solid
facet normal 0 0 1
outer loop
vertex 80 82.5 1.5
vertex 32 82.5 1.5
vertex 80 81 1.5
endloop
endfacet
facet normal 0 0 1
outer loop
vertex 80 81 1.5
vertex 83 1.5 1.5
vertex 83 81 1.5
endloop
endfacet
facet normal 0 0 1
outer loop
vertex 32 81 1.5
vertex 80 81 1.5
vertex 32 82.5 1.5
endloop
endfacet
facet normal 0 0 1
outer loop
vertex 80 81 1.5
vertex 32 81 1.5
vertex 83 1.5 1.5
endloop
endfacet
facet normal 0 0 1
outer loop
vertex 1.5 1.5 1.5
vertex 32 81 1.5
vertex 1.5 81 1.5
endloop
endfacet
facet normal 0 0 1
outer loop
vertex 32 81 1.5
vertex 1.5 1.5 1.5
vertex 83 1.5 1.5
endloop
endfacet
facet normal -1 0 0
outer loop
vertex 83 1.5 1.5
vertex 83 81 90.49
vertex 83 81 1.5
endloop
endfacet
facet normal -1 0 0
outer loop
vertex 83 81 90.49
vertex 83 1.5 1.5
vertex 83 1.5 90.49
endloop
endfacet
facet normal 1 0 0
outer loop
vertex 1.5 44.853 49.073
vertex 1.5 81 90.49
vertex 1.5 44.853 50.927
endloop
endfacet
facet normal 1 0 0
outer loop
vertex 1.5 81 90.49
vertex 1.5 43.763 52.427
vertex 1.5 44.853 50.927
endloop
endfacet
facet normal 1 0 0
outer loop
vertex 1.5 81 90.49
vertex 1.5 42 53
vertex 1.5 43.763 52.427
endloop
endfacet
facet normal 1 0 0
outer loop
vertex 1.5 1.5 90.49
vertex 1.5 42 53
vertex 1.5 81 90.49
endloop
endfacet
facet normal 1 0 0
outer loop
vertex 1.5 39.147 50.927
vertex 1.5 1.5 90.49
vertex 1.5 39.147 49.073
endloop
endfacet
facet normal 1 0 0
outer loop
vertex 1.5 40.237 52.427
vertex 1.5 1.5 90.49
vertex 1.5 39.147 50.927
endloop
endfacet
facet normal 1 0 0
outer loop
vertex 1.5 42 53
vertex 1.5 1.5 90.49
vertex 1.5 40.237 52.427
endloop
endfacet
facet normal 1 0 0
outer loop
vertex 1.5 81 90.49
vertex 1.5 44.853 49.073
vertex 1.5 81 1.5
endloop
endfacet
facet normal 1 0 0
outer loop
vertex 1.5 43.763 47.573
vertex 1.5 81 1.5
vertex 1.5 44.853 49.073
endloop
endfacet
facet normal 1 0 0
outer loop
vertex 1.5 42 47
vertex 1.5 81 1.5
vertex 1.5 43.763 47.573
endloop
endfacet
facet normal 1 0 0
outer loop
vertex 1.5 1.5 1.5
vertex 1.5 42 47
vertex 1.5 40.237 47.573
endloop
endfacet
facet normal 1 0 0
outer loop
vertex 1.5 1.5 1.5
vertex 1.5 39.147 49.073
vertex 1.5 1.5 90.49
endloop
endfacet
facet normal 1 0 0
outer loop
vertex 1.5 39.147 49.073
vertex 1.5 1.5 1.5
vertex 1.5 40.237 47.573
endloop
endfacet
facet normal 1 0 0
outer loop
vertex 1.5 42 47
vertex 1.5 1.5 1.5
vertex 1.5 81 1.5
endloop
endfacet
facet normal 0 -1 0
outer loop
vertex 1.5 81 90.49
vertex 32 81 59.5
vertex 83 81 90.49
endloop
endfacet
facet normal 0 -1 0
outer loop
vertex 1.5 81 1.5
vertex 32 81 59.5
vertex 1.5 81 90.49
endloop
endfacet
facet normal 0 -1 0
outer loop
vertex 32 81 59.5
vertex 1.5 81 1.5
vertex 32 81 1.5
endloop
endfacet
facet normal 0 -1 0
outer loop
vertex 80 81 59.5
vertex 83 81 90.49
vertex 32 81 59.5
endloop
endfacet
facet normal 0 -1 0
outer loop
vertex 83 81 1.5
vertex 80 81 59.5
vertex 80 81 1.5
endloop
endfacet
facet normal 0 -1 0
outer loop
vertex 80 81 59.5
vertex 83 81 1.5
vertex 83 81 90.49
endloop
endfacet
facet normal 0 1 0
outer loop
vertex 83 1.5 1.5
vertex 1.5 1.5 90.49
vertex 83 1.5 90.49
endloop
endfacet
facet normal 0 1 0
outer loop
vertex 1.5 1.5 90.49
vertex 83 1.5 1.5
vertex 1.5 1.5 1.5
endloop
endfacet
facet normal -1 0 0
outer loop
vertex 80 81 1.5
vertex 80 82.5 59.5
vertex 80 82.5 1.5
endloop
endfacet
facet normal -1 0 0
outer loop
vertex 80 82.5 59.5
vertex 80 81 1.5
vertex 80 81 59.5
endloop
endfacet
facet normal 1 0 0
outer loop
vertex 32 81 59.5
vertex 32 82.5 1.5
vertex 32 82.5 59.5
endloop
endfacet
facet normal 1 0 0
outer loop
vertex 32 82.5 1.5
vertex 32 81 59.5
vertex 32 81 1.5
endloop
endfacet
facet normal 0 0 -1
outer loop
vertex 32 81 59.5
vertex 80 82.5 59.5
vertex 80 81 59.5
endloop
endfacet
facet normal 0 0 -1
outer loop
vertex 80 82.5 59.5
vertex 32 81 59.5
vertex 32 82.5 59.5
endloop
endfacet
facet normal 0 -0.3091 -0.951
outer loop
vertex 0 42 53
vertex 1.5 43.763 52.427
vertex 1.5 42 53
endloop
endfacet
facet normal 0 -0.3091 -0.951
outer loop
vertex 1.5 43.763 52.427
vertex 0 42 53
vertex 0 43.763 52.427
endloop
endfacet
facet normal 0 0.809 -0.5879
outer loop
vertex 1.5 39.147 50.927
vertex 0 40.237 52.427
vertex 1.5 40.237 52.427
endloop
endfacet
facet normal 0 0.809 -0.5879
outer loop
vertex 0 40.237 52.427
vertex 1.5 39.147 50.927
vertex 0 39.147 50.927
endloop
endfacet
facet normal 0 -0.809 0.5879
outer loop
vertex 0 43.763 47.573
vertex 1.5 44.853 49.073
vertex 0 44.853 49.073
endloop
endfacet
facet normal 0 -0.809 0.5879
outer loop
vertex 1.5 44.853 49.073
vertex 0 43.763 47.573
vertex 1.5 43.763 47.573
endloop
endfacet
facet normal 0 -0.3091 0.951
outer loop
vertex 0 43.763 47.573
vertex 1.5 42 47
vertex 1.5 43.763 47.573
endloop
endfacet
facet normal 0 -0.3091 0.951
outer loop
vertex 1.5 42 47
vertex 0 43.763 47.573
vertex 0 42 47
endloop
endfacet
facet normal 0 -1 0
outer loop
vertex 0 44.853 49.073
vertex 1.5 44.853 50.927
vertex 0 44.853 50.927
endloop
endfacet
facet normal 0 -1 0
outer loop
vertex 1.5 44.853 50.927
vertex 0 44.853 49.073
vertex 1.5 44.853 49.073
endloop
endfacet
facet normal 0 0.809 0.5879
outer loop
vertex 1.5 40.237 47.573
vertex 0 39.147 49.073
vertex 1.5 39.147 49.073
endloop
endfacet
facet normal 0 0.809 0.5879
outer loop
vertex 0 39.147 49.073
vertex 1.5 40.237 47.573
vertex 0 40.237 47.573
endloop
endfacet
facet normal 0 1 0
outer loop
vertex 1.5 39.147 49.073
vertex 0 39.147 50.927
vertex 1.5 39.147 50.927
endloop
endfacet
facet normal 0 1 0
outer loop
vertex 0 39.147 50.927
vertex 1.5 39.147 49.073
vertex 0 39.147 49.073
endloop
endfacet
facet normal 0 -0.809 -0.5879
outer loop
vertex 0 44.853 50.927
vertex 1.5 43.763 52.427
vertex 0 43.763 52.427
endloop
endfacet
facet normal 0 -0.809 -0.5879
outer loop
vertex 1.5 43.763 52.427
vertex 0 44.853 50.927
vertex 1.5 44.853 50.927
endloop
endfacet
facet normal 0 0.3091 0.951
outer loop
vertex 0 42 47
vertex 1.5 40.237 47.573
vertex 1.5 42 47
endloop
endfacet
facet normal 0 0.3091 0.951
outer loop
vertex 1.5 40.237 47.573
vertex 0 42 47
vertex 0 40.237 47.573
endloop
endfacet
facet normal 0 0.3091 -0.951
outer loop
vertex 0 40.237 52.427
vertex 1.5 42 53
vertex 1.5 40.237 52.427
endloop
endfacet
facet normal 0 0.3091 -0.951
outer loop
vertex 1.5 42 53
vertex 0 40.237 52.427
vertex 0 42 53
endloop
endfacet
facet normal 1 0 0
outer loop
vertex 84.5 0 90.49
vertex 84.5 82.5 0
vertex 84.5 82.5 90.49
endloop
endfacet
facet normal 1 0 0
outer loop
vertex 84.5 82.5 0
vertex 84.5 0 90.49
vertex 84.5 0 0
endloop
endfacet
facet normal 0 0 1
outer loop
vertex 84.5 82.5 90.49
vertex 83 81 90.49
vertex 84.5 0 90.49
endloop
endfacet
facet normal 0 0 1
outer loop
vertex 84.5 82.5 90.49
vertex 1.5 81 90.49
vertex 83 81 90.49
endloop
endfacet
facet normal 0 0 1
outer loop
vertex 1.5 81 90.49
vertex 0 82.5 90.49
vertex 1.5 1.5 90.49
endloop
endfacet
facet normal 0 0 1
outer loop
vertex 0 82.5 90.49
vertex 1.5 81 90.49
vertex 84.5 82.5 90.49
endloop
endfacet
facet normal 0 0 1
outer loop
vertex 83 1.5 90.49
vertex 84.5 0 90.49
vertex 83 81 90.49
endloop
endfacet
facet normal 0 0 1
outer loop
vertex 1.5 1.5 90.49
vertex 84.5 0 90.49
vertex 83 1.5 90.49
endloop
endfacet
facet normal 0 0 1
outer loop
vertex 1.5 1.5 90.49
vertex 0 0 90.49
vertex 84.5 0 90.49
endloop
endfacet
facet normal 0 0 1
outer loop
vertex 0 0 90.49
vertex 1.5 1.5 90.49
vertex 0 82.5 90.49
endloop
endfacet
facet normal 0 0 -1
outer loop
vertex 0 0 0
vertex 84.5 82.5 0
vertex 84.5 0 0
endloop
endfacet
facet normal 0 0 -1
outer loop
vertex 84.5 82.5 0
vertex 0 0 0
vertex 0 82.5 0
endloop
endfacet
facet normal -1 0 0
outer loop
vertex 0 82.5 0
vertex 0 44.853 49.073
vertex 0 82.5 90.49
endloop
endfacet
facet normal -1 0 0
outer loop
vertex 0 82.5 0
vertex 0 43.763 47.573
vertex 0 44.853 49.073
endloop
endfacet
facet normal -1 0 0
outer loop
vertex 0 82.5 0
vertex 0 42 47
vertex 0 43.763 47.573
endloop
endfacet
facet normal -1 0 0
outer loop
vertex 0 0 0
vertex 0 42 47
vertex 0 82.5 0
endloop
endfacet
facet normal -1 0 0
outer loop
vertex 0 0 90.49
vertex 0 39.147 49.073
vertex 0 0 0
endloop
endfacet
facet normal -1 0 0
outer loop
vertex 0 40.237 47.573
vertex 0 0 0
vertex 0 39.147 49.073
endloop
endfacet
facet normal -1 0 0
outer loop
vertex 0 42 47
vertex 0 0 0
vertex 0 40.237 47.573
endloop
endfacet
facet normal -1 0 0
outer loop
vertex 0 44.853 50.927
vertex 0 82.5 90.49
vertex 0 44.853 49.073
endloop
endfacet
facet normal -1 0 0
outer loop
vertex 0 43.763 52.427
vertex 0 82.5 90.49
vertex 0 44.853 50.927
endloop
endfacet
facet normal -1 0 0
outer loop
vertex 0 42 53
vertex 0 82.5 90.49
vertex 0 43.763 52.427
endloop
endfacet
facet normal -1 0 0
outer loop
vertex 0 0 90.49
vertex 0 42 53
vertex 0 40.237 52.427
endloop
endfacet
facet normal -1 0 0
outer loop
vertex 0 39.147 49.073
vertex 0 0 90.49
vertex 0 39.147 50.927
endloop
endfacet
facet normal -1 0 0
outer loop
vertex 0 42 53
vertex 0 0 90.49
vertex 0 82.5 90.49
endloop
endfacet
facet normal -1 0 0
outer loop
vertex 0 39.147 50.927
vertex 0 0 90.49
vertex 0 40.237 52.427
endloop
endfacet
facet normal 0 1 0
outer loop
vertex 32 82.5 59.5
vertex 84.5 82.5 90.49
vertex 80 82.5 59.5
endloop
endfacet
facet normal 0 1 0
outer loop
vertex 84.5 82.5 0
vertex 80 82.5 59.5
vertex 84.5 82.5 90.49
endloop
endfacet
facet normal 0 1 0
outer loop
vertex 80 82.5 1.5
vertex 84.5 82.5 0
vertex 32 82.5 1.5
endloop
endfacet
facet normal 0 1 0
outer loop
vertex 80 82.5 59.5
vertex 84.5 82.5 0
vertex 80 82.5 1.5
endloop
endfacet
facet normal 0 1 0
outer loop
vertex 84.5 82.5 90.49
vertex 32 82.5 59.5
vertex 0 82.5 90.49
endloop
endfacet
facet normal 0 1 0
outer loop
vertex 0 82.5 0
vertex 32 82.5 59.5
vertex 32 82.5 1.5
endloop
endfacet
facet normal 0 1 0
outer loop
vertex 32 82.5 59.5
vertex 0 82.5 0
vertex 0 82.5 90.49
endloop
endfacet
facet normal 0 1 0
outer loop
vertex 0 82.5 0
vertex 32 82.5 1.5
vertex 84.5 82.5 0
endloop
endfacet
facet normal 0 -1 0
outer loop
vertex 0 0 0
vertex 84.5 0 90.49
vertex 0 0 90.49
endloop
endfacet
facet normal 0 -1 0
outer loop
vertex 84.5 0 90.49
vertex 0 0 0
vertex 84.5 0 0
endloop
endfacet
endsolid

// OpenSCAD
function horny() = 81;
function hornx() = 89;
function hornz() = 80;


module horn2(d=3) {
    dia=6;
    hornoutletx=58;
    hornoutlety = d;
    hornoutletz = 48;

    hornzinset = d;

    translate([0,d,hornx()+d]) 
    rotate([0,90,0]) 
    union() {
        translate([0,0,hornzinset]) cube([hornx(),horny()-hornoutlety,hornz()+hornzinset]);
        
        translate([hornx()-hornoutletx,horny()-hornoutlety-0.01,hornz()-hornoutletz]) cube([hornoutletx,hornoutlety+0.02,hornoutletz]);
        
        translate([horny()/2,horny()/2,-0.01]) cylinder(d=dia,h=(hornz()+hornzinset())/2,h=hornz());
    }
}
difference() {
    wall=1.5;
    cube([hornz()+3*wall,horny()+wall,hornx()+wall-0.01]);
    horn2(wall);
}
